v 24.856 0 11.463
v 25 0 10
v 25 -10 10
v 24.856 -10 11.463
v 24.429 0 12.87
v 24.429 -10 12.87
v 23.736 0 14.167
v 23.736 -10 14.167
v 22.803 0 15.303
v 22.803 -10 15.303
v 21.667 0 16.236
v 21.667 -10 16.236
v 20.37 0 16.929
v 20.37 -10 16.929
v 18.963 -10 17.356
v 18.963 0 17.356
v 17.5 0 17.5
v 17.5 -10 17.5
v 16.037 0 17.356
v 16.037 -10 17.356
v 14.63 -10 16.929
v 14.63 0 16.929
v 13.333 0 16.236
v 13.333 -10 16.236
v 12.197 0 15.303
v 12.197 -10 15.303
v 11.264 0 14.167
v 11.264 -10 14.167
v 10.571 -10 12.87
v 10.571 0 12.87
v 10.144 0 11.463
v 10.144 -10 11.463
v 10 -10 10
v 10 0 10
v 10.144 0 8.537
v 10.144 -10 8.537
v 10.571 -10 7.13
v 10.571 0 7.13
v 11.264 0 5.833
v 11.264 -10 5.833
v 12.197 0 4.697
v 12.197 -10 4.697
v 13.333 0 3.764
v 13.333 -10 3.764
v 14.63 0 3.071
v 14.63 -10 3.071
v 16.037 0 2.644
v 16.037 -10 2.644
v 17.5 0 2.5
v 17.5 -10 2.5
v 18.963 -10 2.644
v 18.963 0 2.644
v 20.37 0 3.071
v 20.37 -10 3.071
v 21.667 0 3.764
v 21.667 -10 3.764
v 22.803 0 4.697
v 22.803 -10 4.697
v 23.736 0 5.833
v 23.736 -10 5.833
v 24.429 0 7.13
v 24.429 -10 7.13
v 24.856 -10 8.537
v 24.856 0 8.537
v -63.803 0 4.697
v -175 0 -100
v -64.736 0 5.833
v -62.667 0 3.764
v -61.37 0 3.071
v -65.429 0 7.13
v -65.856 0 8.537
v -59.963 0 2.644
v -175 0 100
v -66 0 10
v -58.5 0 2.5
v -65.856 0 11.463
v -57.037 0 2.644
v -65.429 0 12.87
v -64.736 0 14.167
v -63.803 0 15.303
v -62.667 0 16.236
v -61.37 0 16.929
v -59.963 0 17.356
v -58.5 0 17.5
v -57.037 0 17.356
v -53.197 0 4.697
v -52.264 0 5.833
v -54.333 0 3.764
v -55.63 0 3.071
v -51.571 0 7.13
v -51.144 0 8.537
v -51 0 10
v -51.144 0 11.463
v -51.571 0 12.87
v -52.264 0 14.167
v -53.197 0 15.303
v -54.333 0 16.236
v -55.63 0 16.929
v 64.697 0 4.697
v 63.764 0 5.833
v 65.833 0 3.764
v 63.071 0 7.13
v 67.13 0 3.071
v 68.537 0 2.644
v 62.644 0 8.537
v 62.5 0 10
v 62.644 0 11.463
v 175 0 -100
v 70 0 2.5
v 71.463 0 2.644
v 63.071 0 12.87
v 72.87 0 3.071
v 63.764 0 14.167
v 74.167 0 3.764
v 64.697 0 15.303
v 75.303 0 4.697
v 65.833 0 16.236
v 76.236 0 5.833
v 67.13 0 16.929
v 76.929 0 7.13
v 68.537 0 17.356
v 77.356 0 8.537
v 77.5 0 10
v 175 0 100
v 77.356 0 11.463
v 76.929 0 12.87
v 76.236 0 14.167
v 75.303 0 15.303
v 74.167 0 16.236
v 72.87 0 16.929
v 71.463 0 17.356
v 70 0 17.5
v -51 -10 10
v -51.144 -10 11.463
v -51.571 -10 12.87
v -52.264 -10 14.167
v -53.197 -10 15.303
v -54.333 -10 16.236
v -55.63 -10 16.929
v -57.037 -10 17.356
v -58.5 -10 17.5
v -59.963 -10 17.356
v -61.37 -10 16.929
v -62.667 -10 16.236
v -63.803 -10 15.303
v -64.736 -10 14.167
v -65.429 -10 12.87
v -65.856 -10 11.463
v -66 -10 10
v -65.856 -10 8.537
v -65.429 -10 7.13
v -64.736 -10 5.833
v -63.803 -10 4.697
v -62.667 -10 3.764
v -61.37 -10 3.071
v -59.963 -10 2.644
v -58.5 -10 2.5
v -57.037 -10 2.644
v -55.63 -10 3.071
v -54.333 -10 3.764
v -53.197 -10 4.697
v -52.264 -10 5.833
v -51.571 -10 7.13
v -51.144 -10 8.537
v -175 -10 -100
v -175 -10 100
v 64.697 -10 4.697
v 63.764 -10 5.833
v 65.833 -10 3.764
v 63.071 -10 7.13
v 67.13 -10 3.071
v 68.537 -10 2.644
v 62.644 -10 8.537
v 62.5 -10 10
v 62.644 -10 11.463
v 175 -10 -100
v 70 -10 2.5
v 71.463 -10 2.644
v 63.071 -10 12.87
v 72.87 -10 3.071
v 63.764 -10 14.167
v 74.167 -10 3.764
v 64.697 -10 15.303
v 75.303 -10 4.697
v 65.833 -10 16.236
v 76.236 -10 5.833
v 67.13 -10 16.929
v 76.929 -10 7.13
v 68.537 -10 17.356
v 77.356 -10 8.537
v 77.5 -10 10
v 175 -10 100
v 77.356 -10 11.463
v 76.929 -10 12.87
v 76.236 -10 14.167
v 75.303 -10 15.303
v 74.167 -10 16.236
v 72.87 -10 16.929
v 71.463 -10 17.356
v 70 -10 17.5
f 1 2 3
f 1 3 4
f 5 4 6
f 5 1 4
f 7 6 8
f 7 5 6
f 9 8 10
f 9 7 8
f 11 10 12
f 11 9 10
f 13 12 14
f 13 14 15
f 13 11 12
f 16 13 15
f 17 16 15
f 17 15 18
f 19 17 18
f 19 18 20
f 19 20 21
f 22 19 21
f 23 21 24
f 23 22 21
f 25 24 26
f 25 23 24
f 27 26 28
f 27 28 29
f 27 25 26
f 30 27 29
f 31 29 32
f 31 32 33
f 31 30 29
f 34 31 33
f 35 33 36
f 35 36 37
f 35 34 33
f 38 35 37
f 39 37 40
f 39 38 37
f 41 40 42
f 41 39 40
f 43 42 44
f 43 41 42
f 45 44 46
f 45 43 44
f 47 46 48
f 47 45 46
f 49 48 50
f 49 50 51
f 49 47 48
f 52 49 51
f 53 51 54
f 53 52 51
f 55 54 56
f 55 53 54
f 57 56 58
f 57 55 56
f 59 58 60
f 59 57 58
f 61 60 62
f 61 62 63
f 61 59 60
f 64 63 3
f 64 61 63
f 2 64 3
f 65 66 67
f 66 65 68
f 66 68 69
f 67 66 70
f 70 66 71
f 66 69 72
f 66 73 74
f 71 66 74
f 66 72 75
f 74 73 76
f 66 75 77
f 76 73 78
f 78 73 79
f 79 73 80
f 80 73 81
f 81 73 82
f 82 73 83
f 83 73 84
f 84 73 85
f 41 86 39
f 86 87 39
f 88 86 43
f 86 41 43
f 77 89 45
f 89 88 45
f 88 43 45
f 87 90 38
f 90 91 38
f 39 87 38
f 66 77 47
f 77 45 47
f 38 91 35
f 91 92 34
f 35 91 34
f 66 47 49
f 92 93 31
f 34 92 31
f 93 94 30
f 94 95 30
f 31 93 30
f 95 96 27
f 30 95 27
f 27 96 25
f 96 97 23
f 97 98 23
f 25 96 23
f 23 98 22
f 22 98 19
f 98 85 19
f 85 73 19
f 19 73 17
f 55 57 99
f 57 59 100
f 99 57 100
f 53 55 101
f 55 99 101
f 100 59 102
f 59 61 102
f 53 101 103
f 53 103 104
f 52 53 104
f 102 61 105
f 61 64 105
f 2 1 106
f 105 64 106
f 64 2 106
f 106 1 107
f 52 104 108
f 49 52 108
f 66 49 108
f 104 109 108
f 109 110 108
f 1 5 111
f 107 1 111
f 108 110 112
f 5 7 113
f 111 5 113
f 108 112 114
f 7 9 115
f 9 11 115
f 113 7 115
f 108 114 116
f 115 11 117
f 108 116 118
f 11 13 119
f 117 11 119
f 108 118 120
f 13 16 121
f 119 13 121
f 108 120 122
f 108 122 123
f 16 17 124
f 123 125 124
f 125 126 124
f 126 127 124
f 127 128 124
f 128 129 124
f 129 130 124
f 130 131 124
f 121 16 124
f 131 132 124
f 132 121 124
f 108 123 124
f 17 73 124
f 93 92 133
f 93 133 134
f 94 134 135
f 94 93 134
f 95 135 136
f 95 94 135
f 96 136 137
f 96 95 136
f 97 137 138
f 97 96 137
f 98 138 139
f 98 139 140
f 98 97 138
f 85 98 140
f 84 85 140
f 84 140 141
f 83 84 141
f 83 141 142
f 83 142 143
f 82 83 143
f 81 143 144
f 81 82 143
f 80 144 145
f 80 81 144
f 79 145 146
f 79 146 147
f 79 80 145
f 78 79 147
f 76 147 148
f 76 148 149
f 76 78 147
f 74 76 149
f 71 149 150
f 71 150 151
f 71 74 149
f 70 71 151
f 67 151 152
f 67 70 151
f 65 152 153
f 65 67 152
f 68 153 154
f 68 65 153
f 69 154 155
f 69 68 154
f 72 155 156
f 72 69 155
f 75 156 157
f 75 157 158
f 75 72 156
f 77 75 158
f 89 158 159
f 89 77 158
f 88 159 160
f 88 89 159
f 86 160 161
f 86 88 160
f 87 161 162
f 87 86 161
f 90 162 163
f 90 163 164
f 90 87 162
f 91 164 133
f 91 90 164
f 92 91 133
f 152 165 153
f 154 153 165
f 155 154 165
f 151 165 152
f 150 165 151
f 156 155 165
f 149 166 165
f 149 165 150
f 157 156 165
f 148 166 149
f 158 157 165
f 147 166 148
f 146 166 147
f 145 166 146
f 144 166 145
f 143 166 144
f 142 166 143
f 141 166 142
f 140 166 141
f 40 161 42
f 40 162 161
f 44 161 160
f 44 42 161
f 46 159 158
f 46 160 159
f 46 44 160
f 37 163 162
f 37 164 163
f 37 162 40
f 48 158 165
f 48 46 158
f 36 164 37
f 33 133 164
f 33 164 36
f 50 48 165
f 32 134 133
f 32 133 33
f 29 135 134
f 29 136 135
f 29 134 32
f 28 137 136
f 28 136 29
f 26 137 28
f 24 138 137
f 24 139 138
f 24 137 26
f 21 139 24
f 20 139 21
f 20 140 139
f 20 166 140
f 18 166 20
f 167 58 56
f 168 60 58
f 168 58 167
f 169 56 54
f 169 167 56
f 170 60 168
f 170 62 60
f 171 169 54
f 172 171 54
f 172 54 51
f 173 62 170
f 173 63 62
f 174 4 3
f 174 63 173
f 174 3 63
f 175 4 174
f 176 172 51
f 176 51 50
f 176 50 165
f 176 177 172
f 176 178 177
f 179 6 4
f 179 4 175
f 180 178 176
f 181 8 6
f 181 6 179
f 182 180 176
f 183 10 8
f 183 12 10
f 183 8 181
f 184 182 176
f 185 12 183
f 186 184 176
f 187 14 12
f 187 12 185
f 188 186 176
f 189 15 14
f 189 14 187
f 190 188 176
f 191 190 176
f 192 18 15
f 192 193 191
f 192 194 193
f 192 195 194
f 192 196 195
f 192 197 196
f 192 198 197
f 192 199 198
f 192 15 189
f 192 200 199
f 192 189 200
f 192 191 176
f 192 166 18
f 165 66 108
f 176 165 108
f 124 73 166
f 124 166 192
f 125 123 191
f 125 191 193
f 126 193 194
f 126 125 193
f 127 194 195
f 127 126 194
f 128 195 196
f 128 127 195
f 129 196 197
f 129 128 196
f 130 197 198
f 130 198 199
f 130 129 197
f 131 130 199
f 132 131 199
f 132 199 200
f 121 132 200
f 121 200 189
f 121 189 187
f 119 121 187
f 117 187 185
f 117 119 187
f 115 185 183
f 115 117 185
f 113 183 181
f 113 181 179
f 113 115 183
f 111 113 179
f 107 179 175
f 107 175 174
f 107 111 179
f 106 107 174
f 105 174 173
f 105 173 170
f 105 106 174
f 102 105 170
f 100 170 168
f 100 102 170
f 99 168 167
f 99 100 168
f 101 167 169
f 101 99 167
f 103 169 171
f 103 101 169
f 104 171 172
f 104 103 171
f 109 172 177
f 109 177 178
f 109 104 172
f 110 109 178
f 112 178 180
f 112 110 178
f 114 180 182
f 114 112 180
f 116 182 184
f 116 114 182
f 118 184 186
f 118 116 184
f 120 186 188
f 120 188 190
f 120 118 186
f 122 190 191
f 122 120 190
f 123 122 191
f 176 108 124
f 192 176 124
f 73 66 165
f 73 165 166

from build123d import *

# Parameters (mm, degrees)
F0_W     = 350
F0_H     = 200
F0_R     = 7.5
F1_DEPTH = 10


with BuildPart() as f1:
    # F0 (on Front) → F1 (new body)
    with BuildSketch(Plane.XZ):
        Rectangle(F0_W, F0_H)
        with Locations((-58.5, 10)):
            Circle(F0_R, mode=Mode.SUBTRACT)
        with Locations((17.5, 10)):
            Circle(F0_R, mode=Mode.SUBTRACT)
        with Locations((70, 10)):
            Circle(F0_R, mode=Mode.SUBTRACT)
    extrude(amount=F1_DEPTH)


solid = f1.part
